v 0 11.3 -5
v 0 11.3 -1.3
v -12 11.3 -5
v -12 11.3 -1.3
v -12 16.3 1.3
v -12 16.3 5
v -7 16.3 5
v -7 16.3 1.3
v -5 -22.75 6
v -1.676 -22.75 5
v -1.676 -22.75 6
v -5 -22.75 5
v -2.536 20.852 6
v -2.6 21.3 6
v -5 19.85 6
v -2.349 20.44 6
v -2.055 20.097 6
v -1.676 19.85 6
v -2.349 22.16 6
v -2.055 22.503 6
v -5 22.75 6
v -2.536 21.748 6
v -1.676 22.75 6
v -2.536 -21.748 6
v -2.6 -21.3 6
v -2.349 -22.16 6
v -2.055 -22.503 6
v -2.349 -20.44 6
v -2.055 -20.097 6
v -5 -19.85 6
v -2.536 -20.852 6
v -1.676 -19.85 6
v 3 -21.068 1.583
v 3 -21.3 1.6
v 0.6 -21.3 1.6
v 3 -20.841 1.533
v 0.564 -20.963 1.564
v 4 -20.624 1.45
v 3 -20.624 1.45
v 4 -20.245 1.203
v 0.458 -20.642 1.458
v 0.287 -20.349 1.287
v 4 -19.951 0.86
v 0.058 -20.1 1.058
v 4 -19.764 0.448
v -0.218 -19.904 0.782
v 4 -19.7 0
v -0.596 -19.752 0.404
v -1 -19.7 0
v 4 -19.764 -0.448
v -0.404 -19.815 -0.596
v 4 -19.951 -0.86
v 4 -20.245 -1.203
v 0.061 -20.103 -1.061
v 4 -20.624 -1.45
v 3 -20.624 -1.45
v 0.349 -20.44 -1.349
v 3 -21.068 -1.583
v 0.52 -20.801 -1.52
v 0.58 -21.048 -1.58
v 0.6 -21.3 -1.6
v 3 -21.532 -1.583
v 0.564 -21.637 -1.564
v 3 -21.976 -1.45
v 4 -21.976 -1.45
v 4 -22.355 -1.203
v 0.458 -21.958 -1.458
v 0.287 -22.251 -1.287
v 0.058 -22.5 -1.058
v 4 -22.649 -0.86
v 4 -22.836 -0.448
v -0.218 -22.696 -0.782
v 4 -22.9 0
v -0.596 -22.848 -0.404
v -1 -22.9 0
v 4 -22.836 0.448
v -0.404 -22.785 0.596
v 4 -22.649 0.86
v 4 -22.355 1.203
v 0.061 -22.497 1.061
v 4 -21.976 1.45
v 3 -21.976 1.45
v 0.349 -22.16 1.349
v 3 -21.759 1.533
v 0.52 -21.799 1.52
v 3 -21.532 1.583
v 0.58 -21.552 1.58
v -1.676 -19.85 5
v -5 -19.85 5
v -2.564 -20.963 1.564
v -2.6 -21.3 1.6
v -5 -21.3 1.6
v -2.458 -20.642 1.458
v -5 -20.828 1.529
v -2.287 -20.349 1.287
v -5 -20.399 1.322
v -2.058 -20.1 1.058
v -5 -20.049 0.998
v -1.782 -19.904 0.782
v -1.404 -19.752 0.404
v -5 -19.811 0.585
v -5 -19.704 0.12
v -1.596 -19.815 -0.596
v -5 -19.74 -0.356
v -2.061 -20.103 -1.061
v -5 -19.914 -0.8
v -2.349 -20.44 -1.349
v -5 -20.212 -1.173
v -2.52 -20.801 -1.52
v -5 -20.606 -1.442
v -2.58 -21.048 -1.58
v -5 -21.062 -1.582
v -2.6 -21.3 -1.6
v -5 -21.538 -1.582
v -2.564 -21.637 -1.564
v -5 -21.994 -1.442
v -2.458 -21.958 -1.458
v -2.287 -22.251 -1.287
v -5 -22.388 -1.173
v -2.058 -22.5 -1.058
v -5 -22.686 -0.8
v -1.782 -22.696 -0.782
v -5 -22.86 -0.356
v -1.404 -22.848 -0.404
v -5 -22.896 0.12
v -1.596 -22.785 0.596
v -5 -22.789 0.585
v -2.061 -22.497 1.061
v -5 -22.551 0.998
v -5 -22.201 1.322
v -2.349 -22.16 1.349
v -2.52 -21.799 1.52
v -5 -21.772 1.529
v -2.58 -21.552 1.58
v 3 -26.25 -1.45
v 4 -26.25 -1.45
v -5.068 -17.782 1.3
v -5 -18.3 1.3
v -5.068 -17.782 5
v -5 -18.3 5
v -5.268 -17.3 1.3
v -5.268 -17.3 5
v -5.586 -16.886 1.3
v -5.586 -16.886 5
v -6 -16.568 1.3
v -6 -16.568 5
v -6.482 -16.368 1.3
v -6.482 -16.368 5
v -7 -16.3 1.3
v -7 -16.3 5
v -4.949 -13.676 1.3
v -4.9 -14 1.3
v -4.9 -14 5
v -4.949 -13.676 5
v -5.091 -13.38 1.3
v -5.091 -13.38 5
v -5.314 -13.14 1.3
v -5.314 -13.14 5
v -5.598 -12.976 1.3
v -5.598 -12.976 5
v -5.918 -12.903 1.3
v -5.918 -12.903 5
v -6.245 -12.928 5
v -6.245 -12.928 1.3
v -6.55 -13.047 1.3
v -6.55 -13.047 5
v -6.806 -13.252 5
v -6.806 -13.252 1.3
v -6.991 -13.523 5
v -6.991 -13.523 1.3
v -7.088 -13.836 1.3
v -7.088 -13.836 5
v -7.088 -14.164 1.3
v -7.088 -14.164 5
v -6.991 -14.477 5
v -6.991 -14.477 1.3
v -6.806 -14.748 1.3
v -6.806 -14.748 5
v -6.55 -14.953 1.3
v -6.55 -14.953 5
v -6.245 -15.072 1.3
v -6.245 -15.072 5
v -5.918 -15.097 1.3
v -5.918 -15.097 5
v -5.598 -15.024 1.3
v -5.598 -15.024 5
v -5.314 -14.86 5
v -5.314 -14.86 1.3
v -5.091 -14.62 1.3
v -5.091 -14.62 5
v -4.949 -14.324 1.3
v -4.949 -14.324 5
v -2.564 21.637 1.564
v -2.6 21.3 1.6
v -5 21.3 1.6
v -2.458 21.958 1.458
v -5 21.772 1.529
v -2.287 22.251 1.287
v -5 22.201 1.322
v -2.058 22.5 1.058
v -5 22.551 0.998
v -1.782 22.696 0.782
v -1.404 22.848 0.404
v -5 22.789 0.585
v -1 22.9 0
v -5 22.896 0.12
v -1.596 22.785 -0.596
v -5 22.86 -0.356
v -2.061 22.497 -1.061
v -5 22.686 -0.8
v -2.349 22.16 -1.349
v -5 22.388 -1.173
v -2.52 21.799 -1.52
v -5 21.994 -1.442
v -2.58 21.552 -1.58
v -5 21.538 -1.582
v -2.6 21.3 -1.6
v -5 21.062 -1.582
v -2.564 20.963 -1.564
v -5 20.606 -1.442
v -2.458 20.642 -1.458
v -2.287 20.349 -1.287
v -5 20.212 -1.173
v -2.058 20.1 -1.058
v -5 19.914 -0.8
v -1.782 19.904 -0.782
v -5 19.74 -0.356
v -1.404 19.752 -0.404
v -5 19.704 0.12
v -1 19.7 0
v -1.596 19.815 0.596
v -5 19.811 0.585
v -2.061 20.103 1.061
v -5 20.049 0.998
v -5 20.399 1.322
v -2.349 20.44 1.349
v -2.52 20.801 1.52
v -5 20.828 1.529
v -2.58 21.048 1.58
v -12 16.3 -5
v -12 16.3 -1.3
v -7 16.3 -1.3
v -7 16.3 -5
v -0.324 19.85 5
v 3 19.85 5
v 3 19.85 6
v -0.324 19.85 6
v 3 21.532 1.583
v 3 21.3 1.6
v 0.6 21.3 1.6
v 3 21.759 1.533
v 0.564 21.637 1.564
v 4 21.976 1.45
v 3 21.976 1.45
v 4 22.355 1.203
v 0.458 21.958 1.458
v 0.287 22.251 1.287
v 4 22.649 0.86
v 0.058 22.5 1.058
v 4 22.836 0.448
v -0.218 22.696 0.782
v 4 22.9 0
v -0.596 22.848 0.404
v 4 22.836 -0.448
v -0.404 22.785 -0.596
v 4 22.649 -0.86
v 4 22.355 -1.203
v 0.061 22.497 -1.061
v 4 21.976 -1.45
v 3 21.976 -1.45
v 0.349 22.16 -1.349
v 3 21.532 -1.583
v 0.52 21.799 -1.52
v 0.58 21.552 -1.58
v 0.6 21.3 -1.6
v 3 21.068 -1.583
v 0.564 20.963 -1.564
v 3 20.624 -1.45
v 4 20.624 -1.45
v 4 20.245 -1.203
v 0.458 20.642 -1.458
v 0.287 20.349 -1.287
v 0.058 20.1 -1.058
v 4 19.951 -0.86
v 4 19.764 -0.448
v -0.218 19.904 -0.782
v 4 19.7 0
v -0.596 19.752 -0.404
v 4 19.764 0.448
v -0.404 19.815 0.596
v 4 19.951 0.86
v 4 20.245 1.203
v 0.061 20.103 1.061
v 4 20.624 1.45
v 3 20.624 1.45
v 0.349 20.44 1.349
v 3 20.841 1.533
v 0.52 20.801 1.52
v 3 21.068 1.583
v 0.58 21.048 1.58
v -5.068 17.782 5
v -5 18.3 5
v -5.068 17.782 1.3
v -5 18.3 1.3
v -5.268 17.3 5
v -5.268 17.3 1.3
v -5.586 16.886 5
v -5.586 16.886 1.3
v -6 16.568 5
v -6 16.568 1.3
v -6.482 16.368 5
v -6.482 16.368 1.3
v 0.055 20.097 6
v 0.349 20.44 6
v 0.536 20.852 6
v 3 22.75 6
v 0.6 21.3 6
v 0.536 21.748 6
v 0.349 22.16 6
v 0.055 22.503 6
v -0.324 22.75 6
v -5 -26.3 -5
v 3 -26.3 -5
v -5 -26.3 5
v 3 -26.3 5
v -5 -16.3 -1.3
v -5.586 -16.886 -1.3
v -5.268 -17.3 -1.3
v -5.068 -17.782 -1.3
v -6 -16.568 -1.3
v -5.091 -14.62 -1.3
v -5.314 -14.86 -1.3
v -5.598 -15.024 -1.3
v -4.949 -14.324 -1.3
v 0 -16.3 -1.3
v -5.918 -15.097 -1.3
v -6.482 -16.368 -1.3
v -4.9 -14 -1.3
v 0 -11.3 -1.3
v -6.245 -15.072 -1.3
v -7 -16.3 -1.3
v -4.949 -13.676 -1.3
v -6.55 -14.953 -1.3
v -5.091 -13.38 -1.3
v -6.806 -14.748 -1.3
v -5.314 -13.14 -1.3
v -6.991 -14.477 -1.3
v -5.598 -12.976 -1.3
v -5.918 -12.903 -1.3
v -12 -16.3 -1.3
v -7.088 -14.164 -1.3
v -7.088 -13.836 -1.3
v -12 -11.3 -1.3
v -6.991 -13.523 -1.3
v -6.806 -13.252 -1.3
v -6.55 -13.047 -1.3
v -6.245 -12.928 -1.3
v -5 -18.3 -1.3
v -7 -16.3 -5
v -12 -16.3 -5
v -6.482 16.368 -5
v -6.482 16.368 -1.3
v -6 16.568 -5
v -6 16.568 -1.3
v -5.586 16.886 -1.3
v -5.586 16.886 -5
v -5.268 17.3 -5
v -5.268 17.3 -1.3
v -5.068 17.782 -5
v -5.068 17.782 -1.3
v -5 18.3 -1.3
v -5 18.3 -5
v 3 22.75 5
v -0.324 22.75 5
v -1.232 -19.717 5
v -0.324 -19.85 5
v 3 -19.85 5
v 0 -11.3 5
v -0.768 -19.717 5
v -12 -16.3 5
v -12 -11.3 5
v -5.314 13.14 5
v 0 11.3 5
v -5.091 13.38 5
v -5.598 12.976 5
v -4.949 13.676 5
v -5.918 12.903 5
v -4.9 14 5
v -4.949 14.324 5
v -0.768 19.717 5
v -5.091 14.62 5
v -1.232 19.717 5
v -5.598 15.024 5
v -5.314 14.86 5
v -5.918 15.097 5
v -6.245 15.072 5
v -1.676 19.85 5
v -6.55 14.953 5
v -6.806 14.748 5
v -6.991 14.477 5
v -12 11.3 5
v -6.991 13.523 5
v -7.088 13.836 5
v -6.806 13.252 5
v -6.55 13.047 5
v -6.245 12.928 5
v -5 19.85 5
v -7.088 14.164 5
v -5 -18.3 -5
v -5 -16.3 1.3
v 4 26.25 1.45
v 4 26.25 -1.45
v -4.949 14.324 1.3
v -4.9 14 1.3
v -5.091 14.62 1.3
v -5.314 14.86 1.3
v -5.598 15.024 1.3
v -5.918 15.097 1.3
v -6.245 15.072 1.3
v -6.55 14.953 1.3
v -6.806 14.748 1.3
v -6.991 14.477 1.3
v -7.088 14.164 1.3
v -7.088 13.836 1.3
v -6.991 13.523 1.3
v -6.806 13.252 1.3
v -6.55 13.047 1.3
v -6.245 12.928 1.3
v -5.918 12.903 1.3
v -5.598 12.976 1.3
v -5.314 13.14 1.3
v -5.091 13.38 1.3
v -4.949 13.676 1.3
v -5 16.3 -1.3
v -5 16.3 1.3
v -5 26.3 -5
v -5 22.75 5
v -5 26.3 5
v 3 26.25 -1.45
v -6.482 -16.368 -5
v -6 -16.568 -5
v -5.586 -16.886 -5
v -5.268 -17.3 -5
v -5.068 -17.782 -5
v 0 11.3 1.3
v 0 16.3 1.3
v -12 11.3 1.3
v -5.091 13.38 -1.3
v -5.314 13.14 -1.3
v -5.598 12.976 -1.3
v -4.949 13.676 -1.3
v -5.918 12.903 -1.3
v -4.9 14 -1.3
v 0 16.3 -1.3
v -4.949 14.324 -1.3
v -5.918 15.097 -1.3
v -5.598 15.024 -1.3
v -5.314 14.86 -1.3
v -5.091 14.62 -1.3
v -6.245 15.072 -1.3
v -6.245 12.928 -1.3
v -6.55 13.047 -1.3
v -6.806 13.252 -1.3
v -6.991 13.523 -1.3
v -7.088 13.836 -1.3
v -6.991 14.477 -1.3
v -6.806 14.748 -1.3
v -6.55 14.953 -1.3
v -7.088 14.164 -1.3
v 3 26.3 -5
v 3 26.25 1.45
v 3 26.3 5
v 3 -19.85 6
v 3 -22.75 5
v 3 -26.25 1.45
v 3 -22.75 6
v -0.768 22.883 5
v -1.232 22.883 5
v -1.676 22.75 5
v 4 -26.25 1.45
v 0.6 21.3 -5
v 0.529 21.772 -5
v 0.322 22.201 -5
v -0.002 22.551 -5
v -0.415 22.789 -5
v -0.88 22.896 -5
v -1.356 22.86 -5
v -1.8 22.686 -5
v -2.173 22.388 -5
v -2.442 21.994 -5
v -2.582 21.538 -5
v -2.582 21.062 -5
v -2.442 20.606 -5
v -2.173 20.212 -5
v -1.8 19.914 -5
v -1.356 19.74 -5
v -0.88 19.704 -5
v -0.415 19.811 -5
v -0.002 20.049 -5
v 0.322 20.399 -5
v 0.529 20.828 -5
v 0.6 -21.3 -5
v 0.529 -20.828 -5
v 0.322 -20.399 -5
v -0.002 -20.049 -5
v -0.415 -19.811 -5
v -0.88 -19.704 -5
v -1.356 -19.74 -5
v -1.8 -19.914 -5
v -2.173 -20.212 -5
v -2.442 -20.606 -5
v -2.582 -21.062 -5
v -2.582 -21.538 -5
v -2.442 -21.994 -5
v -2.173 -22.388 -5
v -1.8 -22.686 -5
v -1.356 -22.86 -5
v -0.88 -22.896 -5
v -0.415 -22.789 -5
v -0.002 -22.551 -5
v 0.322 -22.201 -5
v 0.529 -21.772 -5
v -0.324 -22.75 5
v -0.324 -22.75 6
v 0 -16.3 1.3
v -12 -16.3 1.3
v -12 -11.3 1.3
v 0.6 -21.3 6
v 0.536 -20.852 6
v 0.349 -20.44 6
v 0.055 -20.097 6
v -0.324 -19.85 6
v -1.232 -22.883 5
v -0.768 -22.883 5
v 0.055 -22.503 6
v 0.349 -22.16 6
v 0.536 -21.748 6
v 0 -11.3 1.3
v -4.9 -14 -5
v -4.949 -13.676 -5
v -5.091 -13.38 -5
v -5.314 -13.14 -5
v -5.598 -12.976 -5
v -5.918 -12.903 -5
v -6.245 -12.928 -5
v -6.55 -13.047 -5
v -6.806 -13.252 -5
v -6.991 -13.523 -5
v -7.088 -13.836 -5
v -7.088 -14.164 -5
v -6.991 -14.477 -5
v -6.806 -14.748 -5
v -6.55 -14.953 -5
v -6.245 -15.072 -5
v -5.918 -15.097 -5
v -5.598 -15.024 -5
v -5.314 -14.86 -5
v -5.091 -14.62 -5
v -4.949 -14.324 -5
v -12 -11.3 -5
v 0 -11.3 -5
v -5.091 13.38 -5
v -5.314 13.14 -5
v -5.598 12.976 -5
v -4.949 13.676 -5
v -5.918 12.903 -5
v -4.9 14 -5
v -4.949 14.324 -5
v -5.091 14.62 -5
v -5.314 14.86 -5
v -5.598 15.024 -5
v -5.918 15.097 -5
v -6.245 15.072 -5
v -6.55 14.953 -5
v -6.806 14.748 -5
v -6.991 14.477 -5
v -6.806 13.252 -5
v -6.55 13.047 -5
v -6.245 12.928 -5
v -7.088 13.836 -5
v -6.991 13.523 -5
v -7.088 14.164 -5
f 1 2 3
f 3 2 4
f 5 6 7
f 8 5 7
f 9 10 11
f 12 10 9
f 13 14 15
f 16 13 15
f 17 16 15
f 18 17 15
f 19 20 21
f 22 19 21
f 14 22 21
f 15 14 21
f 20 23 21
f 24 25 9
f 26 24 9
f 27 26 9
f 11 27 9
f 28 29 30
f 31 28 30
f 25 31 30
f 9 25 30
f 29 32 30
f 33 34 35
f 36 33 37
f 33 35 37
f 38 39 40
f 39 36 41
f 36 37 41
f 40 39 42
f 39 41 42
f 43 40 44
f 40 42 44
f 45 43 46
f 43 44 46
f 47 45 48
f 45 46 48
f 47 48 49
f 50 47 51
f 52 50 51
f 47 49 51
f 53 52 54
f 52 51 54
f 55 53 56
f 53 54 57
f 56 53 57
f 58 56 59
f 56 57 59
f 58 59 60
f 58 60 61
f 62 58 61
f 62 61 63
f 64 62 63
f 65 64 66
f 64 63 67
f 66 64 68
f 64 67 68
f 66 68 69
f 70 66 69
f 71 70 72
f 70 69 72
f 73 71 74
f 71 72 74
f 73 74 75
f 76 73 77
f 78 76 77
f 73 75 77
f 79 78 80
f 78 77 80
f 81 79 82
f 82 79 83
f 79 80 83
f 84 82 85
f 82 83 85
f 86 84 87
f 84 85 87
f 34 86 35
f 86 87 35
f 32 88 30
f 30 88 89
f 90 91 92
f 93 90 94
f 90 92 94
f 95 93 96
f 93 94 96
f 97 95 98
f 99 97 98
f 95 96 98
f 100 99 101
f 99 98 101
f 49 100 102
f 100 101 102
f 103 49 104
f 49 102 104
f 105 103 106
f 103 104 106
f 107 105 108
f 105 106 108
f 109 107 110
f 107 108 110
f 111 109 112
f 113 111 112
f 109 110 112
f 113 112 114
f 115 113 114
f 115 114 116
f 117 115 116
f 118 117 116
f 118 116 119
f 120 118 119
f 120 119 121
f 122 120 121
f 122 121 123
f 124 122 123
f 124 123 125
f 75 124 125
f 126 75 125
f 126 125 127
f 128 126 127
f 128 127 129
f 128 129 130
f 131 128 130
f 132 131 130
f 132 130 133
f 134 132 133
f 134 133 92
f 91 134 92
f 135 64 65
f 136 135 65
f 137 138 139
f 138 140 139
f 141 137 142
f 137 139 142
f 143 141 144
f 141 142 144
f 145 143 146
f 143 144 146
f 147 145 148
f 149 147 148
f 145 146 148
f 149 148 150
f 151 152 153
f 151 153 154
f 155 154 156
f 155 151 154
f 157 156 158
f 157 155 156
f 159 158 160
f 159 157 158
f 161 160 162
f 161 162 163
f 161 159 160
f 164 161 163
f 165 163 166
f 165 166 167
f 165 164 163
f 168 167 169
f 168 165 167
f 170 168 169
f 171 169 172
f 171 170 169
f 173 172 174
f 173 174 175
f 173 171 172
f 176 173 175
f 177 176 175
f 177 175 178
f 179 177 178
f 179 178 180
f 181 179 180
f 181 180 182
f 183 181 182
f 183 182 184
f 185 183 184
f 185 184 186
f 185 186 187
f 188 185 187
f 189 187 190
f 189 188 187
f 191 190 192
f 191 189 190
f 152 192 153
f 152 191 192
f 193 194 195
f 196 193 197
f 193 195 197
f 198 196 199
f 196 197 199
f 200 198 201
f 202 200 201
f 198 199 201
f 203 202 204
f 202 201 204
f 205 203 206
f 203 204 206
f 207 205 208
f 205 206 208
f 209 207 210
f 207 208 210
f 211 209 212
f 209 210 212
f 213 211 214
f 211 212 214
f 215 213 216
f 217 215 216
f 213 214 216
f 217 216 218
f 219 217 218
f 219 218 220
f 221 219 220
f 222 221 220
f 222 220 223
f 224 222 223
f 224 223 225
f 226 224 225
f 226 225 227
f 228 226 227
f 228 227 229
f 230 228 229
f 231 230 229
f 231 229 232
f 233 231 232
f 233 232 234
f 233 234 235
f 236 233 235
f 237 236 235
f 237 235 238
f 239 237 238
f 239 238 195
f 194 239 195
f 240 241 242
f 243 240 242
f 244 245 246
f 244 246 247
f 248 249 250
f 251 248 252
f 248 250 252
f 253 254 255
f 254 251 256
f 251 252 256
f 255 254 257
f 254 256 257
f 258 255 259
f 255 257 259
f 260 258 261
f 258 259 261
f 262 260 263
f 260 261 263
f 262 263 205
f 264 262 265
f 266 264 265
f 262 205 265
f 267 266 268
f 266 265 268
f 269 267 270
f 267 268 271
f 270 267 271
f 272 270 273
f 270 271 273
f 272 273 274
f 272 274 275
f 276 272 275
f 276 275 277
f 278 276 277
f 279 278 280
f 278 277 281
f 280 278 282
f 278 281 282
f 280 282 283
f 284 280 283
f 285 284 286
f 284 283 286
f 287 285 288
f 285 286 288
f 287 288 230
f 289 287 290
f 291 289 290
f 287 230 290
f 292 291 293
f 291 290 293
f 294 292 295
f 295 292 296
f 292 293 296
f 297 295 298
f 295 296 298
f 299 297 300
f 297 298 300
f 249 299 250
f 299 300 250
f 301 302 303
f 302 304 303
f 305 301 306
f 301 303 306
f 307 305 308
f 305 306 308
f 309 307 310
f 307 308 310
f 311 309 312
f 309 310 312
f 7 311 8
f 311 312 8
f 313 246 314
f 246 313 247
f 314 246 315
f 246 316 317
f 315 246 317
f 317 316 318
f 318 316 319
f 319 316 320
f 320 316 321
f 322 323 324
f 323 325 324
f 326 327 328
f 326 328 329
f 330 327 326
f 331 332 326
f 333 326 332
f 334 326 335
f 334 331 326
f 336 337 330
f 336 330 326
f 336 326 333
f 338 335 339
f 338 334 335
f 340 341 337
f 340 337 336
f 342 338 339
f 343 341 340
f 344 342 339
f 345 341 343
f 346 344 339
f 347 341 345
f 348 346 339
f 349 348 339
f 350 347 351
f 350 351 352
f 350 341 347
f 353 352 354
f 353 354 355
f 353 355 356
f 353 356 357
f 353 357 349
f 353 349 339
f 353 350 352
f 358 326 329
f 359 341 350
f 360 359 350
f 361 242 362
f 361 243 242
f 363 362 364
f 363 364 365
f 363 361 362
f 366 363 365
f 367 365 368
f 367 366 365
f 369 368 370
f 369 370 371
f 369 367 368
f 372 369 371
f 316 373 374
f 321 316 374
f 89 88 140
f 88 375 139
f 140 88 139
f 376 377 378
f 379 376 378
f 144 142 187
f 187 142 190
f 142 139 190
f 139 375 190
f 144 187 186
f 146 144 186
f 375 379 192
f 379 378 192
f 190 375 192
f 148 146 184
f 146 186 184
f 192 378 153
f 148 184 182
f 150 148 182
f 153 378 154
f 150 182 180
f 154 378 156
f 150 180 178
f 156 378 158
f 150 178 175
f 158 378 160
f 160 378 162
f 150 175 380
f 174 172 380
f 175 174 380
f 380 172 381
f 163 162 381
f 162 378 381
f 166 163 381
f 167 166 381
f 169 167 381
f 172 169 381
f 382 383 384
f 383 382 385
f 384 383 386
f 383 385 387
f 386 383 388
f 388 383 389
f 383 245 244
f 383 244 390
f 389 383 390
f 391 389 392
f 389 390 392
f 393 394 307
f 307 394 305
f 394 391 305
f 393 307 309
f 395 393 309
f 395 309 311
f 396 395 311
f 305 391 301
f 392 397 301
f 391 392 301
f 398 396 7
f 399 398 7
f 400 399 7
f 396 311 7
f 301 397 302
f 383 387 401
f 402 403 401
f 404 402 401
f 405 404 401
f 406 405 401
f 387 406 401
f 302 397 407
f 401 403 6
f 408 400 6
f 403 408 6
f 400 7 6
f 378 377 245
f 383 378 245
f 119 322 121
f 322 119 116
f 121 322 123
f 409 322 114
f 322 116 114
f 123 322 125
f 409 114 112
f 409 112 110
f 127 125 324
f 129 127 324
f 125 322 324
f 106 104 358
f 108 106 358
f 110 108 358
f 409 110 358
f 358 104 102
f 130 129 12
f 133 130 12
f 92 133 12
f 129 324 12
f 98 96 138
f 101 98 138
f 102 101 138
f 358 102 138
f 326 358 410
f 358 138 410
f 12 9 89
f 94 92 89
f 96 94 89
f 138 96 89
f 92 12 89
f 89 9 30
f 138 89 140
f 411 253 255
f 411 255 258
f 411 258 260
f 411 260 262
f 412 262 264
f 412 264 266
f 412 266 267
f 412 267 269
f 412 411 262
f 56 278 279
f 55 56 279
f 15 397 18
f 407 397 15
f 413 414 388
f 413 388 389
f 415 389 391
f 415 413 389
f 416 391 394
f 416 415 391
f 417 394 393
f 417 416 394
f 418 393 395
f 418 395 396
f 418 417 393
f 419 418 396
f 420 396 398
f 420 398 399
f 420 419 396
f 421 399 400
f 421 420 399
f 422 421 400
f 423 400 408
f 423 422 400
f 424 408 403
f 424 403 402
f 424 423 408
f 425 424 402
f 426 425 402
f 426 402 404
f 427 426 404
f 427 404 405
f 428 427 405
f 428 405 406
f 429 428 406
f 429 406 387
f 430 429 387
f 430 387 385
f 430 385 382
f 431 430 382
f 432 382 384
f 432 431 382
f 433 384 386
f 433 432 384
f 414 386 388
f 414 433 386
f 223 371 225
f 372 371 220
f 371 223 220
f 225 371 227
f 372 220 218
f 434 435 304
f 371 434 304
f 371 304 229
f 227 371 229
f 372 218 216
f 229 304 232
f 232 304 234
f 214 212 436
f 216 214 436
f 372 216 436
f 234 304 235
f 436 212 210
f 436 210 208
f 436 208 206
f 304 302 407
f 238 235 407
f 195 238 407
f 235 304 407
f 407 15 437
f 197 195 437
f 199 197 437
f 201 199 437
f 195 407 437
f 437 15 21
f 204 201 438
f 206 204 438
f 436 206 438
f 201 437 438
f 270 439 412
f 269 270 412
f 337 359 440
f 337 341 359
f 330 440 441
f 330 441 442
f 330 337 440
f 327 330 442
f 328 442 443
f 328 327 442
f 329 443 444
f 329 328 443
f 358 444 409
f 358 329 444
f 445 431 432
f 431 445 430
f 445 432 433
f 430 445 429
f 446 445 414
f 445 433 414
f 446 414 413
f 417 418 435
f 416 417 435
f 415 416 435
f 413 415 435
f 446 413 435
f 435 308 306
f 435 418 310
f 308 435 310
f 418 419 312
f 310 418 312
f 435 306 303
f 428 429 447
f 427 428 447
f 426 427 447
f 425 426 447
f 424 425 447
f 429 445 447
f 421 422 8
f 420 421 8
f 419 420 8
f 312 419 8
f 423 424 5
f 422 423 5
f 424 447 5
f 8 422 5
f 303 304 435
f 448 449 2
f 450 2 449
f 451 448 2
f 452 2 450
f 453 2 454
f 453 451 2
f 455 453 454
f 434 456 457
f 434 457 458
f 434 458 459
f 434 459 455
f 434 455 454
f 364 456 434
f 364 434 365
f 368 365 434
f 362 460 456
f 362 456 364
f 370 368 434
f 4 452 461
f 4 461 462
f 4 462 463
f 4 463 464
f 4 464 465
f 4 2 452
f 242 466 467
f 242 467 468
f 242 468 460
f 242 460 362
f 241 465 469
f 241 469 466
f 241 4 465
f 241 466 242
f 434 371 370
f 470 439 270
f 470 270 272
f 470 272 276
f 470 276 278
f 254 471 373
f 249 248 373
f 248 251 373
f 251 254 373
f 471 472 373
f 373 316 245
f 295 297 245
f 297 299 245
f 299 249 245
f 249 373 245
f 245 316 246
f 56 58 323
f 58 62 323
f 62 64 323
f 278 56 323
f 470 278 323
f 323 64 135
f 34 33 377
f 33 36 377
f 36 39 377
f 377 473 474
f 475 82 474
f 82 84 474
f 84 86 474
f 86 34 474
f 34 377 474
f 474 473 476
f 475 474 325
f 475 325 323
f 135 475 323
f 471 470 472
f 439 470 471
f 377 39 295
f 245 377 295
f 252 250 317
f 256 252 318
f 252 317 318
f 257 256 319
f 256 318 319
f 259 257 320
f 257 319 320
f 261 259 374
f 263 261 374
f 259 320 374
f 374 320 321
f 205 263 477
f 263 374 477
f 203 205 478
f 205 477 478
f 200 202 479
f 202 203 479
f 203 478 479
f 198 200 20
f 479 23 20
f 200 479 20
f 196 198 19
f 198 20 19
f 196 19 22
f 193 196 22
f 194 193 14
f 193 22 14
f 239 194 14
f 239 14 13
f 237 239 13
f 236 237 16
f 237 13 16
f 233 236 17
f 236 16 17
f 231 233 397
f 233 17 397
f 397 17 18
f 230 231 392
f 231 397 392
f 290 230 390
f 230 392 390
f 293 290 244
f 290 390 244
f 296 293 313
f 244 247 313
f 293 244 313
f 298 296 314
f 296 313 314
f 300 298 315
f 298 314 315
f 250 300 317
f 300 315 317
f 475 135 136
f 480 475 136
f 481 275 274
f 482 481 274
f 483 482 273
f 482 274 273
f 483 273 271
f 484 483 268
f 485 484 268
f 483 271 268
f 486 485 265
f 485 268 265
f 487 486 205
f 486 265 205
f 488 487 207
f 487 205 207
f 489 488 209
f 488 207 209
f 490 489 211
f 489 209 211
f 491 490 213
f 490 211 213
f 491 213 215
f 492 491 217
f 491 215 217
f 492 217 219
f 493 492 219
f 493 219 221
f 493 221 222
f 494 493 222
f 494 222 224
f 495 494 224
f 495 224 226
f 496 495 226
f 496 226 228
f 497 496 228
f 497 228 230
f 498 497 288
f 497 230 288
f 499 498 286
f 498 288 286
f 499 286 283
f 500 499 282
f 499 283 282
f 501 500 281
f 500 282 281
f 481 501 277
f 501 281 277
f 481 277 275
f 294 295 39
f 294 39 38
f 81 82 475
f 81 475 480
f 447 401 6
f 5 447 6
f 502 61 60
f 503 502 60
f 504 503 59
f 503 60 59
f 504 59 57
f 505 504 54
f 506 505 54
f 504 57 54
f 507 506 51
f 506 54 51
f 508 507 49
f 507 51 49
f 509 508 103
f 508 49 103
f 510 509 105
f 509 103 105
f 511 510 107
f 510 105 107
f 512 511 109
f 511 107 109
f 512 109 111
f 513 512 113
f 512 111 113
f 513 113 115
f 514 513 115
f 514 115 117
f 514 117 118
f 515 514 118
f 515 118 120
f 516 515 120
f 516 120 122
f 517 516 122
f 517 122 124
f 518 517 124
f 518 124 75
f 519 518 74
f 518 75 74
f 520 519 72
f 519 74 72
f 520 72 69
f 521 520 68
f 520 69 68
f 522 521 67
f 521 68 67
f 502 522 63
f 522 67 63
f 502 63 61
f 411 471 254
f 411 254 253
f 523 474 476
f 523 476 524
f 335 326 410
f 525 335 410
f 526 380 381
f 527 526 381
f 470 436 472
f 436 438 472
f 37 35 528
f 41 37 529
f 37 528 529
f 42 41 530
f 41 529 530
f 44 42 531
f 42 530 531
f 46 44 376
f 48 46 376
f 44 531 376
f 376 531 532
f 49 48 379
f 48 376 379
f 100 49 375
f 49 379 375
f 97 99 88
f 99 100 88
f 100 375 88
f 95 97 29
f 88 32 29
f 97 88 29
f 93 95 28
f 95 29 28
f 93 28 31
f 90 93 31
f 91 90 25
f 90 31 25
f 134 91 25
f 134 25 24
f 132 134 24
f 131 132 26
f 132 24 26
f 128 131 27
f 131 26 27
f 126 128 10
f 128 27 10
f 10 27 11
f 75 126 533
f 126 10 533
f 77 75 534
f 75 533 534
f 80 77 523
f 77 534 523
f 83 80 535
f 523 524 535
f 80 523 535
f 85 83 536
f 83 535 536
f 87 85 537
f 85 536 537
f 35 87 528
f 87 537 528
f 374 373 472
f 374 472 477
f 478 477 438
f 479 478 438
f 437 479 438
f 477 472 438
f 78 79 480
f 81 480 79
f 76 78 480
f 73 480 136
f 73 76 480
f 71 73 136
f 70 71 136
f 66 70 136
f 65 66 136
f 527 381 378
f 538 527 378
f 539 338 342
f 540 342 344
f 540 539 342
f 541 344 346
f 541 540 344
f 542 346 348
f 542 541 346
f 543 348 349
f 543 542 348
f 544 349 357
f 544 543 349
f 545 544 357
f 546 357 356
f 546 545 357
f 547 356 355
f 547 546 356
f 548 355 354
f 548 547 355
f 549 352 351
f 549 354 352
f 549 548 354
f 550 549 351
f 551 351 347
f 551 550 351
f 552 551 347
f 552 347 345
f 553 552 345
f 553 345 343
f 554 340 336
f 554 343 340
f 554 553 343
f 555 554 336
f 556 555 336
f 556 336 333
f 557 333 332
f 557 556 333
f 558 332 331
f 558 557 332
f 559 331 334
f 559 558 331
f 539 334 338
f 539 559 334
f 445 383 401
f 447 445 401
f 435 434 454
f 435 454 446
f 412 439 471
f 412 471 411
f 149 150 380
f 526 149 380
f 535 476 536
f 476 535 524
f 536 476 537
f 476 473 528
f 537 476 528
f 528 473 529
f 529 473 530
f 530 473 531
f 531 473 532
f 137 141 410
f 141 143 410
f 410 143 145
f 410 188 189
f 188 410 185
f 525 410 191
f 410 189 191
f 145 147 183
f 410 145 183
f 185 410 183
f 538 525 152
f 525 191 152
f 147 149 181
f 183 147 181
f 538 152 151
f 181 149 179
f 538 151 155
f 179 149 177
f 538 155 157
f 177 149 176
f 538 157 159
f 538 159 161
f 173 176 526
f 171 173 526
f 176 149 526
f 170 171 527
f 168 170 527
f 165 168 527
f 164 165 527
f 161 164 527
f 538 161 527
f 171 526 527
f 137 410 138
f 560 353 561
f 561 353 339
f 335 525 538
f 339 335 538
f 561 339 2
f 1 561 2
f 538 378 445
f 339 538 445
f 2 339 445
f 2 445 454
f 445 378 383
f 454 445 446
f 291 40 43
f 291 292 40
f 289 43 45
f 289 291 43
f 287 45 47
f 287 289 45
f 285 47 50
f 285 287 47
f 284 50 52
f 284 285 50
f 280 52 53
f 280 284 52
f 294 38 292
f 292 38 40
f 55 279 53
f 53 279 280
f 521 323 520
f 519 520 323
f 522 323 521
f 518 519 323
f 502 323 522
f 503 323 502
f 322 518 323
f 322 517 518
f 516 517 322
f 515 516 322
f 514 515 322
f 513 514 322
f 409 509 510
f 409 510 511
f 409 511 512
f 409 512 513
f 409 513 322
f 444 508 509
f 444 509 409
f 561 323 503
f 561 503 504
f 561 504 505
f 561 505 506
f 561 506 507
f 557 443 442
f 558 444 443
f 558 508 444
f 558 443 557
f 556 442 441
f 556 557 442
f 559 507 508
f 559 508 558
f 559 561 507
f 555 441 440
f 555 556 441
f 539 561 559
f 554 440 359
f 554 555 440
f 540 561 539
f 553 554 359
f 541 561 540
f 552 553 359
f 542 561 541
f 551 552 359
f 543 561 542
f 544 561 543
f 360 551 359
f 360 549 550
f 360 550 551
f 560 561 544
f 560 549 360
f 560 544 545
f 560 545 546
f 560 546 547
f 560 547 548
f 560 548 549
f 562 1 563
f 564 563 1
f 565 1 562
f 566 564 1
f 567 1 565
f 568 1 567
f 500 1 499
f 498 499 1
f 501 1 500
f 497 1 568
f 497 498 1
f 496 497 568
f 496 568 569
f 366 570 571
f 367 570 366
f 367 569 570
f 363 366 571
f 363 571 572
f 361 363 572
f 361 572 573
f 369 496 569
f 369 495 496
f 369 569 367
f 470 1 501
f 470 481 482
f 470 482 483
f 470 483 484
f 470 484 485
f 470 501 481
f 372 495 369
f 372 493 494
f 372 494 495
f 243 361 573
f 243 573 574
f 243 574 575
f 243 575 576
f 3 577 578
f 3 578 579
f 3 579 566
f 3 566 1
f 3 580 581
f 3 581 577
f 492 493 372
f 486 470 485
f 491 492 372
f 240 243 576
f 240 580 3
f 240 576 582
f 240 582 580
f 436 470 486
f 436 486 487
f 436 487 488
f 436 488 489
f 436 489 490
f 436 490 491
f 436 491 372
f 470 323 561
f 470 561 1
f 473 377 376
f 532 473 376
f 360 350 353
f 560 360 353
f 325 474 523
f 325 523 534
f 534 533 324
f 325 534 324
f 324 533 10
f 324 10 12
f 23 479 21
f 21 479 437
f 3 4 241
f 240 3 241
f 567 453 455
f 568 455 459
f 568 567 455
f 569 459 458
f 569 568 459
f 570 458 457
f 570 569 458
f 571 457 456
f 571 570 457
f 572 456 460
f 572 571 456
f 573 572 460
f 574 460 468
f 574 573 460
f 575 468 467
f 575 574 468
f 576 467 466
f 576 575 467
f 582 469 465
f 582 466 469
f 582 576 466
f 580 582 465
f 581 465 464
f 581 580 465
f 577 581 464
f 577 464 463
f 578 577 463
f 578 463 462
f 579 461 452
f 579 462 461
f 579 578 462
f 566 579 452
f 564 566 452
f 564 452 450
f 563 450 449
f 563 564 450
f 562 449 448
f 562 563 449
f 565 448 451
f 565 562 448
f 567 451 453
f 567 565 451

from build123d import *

# Parameters (mm, degrees)
SKETCH1_R                      = 1.1
MAIN_DEPTH                     = 5
SKETCH2_W                      = 1
SKETCH2_H                      = 2.9
MAKERBEAMSUPPORT_DEPTH         = 26.25
SKETCH3_R                      = 1.6
MAKERBEAMHOLES_DEPTH           = 10
SKETCH4_W                      = 2.6
SKETCH4_H                      = 32.6
CUT_EXTRUDE2_DEPTH             = 12
SKETCH5_W                      = 8
SKETCH5_H                      = 2.9
MAKERBEAMTOPSUPPORT_DEPTH      = 1
SKETCH6_R                      = 1.6
MAKERBEAMTOPHOLESSUPPORT_DEPTH = 12
FILLET1_R                      = 2


with BuildPart() as part:
    # Sketch1 → Main (new body, symmetric)
    with BuildSketch(Plane.XY):
        Polygon((0, 11.3), (-12, 11.3), (-12, 16.3), (-5, 16.3), (-5, 26.3), (3, 26.3), (3, -26.3), (-5, -26.3), (-5, -16.3), (-12, -16.3), (-12, -11.3), (0, -11.3), align=None)
        with Locations((-6, 14)):
            Circle(SKETCH1_R, mode=Mode.SUBTRACT)
        with Locations((-6, -14)):
            Circle(SKETCH1_R, mode=Mode.SUBTRACT)
    extrude(amount=MAIN_DEPTH, both=True)

    # Sketch2 → MakerBeamSupport (add, symmetric)
    with BuildSketch(Plane(origin=(0, 0, 0), x_dir=(1, 0, 0), z_dir=(0, 1, 0))):
        with Locations((3.5, 0)):
            Rectangle(SKETCH2_W, SKETCH2_H)
    extrude(amount=MAKERBEAMSUPPORT_DEPTH, both=True)

    # Sketch3 → MakerBeamHoles (cut, through all)
    with BuildSketch(Plane.ZY.offset(5)):
        with Locations((0, 21.3)):
            Circle(SKETCH3_R)
        with Locations((0, -21.3)):
            Circle(SKETCH3_R)
    extrude(amount=-MAKERBEAMHOLES_DEPTH, mode=Mode.SUBTRACT)

    # Sketch4 → Cut-Extrude2 (cut)
    with BuildSketch(Plane.ZY.offset(12)):
        Rectangle(SKETCH4_W, SKETCH4_H)
    extrude(amount=-CUT_EXTRUDE2_DEPTH, mode=Mode.SUBTRACT)

    # Sketch5 → MakerBeamTopSupport (add)
    with BuildSketch(Plane(origin=(0, 0, 5), x_dir=(-1, 0, 0), z_dir=(0, 0, -1))):
        with Locations((1, 21.3)):
            Rectangle(SKETCH5_W, SKETCH5_H)
        with Locations((1, -21.3)):
            Rectangle(SKETCH5_W, SKETCH5_H)
    extrude(amount=-MAKERBEAMTOPSUPPORT_DEPTH)

    # Sketch6 → MakerBeamTopHolesSupport (cut, through all)
    with BuildSketch(Plane.XY.offset(6)):
        with Locations((-1, 21.3)):
            Circle(SKETCH6_R)
        with Locations((-1, -21.3)):
            Circle(SKETCH6_R)
    extrude(amount=-MAKERBEAMTOPHOLESSUPPORT_DEPTH, mode=Mode.SUBTRACT)

    # Fillet1
    fillet1_edges = [part.edges().sort_by_distance(p)[0] for p in [
        (-5, 16.3, 3.15),
        (-5, -16.3, 3.15),
        (-5, 16.3, -3.15),
        (-5, -16.3, -3.15),
    ]]
    fillet(fillet1_edges, radius=FILLET1_R)


solid = part.part
